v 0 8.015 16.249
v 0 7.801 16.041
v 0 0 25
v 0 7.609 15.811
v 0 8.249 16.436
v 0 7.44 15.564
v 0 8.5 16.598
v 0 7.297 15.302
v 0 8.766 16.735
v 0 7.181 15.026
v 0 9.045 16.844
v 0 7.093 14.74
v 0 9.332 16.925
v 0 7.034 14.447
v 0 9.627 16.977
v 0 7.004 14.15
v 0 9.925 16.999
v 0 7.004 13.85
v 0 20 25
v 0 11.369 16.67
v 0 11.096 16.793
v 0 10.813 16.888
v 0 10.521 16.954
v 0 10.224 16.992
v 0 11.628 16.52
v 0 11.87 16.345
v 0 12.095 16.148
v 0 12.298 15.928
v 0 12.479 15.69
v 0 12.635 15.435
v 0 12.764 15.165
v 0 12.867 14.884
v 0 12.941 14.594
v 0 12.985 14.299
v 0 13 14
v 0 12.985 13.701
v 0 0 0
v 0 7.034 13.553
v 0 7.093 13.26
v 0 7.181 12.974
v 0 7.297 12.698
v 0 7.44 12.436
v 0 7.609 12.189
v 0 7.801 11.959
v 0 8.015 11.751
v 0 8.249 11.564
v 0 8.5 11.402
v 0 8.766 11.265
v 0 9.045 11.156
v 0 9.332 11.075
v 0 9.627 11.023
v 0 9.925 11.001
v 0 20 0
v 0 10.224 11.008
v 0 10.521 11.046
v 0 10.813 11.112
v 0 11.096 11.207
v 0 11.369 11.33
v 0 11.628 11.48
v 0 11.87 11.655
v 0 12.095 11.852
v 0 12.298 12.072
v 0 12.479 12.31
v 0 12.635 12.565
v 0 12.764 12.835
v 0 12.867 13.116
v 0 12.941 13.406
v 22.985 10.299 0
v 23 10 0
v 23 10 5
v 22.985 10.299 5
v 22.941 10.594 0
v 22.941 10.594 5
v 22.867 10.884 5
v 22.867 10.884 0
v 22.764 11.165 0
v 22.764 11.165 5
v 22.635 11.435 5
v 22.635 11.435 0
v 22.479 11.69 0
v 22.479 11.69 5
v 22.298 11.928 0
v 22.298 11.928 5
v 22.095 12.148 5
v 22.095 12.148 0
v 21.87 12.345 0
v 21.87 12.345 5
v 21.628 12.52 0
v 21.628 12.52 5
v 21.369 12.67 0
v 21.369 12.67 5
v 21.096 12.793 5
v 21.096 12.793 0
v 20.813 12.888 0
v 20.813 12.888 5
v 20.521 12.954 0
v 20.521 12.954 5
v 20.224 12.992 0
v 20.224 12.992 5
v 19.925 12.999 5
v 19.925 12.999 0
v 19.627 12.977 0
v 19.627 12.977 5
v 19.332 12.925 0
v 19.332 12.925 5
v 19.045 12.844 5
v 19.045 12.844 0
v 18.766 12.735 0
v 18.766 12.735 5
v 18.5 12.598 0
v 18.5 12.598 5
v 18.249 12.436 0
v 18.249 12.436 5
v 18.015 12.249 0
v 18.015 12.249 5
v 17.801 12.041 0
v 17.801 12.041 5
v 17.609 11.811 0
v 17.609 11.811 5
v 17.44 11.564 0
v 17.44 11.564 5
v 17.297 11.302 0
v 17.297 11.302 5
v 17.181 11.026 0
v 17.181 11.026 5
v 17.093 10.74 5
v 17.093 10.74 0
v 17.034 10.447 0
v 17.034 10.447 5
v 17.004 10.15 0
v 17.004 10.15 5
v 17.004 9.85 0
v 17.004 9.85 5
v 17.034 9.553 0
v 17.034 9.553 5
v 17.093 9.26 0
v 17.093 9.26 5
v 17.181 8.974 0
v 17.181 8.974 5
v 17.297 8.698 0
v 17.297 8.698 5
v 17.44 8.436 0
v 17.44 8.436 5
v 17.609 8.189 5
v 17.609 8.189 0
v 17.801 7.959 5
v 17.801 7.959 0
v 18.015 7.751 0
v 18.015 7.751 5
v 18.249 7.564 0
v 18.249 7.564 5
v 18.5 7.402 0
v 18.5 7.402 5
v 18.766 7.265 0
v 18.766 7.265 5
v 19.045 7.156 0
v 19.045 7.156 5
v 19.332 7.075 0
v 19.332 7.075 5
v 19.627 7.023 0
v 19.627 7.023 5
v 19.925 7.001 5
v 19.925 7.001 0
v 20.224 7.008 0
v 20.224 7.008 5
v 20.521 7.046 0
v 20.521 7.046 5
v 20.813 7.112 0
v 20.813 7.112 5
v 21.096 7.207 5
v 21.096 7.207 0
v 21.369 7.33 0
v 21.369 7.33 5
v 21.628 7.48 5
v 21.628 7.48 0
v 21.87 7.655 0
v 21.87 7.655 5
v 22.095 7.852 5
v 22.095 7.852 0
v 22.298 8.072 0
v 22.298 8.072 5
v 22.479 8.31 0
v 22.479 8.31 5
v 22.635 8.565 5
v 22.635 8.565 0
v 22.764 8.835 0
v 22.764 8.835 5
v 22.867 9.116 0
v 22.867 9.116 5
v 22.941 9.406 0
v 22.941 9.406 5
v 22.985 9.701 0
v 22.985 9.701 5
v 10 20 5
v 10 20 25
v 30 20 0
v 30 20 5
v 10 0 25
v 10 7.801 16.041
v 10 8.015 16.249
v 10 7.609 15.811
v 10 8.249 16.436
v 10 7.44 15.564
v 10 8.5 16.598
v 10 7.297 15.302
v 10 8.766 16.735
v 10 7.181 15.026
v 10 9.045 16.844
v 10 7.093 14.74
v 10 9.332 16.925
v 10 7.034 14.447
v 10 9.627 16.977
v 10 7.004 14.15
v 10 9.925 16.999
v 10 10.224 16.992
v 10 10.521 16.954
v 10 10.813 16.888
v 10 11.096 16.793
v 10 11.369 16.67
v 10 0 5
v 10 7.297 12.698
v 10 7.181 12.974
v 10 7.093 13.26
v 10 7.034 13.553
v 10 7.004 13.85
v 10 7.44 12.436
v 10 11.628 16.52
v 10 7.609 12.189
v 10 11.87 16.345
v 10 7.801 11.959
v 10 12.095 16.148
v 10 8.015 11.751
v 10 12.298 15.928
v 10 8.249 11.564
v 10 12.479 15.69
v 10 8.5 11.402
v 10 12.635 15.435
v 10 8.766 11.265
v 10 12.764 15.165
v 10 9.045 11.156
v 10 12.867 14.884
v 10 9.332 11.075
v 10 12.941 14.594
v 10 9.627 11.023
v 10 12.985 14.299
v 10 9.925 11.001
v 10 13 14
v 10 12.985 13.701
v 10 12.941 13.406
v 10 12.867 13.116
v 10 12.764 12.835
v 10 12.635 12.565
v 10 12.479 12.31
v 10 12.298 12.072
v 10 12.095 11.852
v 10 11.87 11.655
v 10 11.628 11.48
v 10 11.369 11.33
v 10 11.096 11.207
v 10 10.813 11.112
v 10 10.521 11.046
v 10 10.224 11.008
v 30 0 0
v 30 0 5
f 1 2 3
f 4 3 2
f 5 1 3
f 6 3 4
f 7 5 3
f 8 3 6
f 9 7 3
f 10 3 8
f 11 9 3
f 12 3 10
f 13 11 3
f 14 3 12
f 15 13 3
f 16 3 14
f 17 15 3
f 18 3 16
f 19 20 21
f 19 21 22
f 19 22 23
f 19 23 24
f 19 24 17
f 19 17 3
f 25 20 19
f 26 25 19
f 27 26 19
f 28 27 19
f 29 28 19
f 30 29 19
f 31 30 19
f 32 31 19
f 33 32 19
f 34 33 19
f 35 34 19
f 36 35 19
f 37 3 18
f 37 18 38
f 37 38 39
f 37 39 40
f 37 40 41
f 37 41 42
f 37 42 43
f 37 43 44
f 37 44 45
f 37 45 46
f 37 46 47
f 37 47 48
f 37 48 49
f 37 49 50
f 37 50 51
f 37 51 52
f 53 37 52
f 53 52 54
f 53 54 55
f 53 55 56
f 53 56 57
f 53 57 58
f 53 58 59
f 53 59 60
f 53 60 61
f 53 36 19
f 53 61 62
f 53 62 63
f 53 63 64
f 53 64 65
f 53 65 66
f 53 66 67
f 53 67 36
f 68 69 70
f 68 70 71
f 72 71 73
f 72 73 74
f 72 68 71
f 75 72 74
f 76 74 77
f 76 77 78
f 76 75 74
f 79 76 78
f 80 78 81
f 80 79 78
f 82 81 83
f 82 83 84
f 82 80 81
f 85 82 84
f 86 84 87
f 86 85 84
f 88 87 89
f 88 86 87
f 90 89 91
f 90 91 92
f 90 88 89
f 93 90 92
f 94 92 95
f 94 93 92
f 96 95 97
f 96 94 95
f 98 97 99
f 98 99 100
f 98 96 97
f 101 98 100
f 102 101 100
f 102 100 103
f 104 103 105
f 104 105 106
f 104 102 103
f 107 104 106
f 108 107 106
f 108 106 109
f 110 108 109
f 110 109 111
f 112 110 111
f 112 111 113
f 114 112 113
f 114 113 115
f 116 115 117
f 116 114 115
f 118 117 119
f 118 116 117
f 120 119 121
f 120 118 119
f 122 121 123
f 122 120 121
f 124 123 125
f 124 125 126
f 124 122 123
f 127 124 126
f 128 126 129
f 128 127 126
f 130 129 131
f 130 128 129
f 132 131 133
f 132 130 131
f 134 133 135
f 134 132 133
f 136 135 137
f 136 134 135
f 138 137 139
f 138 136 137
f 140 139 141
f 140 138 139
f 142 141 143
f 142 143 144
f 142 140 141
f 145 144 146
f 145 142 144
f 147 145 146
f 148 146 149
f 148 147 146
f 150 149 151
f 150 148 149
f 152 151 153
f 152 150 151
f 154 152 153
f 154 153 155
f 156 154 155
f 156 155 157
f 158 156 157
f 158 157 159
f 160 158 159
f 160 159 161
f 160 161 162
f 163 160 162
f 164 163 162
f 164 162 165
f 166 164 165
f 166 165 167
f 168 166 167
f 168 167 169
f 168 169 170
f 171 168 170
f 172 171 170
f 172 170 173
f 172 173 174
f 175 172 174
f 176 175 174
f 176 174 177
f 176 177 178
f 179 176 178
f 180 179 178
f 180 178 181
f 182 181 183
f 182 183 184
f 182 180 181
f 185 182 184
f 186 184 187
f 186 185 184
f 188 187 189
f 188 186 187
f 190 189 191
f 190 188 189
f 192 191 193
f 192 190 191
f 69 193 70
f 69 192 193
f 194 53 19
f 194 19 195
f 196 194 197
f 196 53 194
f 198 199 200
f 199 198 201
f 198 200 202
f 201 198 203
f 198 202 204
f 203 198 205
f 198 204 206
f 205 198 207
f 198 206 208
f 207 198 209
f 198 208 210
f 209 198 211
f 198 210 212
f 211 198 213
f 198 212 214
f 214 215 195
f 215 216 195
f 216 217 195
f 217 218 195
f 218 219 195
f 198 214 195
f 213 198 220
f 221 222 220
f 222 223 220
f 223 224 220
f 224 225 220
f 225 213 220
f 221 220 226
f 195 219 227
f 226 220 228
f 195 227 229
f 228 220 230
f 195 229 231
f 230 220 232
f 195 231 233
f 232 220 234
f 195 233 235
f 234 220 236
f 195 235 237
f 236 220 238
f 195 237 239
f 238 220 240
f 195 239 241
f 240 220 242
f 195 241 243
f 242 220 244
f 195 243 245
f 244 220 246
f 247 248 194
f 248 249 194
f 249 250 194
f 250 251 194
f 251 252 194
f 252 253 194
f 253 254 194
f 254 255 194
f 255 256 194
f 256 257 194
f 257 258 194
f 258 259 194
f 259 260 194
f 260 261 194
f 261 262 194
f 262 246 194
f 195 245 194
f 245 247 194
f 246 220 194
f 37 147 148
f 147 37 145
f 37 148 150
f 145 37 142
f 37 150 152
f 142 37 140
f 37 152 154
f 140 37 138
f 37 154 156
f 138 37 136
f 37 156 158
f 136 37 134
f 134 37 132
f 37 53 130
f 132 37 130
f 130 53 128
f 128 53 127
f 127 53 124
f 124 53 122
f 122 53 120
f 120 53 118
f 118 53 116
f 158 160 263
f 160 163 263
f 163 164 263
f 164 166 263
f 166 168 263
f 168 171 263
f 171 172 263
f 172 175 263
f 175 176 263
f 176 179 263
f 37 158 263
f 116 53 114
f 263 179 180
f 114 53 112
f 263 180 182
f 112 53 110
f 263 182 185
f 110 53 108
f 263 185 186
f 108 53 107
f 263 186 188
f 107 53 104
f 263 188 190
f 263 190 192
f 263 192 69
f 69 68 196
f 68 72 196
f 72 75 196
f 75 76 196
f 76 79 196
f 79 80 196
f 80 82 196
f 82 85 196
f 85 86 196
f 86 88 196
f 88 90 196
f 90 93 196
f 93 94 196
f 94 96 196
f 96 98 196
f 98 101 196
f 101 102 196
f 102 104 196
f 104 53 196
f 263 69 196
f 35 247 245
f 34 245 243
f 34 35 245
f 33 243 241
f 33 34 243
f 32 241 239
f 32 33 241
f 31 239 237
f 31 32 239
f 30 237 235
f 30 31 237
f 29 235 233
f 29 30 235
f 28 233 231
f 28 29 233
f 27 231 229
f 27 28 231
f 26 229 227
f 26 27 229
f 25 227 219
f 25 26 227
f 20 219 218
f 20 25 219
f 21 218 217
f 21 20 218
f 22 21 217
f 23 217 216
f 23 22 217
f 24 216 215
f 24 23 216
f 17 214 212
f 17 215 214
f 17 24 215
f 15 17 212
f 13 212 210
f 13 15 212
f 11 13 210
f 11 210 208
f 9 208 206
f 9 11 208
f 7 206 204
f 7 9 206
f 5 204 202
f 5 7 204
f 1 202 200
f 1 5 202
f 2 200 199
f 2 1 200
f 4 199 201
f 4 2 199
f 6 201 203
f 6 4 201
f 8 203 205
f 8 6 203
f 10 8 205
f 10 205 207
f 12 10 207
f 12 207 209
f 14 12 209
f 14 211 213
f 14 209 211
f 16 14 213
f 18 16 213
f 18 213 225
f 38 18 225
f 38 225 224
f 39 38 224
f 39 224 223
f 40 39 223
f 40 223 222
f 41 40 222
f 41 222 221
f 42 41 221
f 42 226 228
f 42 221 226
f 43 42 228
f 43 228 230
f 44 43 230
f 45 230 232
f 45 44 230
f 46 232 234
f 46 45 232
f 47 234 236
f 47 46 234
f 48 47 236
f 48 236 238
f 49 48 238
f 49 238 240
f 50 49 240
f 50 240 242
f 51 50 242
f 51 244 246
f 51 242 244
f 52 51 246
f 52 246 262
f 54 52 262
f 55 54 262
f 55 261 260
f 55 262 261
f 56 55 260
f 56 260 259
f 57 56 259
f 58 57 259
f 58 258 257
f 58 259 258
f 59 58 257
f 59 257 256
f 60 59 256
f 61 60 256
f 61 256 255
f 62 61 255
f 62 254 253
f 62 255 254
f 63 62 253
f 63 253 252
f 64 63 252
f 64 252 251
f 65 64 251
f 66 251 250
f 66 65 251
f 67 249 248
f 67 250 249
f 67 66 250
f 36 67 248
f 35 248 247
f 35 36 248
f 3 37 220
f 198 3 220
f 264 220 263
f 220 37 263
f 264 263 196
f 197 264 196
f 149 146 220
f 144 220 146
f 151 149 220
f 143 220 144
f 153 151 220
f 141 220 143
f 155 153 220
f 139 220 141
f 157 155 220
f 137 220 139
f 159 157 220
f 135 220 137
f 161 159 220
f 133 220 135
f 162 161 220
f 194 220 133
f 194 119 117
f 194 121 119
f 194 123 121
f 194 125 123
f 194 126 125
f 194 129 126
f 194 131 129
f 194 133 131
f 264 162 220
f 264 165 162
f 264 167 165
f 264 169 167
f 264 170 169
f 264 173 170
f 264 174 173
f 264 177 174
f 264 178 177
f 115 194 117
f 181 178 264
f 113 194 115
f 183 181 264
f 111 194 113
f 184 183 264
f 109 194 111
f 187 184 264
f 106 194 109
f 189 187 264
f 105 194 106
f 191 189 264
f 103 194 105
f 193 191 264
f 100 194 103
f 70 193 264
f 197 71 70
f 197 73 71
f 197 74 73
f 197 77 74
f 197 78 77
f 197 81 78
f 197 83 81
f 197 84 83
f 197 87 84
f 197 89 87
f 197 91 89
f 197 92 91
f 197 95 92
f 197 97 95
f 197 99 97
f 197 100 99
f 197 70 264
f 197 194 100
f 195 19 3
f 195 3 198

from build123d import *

# Parameters (mm, degrees)
F0_W     = 20
F0_H     = 20
F0_R     = 3
F1_DEPTH = 5
F0_W_2   = 10
F2_DEPTH = 25
F3_R     = 3
F4_DEPTH = 25


# Not quite as in the source:
# - a feature names something its author has since deleted; it is built from what else it names


with BuildPart() as f1:
    # F0 (on Top) → F1 (new body)
    with BuildSketch(Plane.XY):
        with Locations((20, 10)):
            Rectangle(F0_W, F0_H)
        with Locations((20, 10)):
            Circle(F0_R, mode=Mode.SUBTRACT)
    extrude(amount=F1_DEPTH)

    # F0 (on Top) → F2 (join)
    with BuildSketch(Plane.XY):
        with Locations((5, 10)):
            Rectangle(F0_W_2, F0_H)
    extrude(amount=F2_DEPTH)

    # F3 (on Right) → F4 (cut)
    with BuildSketch(Plane.YZ):
        with Locations((10, 14)):
            Circle(F3_R)
    extrude(amount=F4_DEPTH, mode=Mode.SUBTRACT)


solid = f1.part
